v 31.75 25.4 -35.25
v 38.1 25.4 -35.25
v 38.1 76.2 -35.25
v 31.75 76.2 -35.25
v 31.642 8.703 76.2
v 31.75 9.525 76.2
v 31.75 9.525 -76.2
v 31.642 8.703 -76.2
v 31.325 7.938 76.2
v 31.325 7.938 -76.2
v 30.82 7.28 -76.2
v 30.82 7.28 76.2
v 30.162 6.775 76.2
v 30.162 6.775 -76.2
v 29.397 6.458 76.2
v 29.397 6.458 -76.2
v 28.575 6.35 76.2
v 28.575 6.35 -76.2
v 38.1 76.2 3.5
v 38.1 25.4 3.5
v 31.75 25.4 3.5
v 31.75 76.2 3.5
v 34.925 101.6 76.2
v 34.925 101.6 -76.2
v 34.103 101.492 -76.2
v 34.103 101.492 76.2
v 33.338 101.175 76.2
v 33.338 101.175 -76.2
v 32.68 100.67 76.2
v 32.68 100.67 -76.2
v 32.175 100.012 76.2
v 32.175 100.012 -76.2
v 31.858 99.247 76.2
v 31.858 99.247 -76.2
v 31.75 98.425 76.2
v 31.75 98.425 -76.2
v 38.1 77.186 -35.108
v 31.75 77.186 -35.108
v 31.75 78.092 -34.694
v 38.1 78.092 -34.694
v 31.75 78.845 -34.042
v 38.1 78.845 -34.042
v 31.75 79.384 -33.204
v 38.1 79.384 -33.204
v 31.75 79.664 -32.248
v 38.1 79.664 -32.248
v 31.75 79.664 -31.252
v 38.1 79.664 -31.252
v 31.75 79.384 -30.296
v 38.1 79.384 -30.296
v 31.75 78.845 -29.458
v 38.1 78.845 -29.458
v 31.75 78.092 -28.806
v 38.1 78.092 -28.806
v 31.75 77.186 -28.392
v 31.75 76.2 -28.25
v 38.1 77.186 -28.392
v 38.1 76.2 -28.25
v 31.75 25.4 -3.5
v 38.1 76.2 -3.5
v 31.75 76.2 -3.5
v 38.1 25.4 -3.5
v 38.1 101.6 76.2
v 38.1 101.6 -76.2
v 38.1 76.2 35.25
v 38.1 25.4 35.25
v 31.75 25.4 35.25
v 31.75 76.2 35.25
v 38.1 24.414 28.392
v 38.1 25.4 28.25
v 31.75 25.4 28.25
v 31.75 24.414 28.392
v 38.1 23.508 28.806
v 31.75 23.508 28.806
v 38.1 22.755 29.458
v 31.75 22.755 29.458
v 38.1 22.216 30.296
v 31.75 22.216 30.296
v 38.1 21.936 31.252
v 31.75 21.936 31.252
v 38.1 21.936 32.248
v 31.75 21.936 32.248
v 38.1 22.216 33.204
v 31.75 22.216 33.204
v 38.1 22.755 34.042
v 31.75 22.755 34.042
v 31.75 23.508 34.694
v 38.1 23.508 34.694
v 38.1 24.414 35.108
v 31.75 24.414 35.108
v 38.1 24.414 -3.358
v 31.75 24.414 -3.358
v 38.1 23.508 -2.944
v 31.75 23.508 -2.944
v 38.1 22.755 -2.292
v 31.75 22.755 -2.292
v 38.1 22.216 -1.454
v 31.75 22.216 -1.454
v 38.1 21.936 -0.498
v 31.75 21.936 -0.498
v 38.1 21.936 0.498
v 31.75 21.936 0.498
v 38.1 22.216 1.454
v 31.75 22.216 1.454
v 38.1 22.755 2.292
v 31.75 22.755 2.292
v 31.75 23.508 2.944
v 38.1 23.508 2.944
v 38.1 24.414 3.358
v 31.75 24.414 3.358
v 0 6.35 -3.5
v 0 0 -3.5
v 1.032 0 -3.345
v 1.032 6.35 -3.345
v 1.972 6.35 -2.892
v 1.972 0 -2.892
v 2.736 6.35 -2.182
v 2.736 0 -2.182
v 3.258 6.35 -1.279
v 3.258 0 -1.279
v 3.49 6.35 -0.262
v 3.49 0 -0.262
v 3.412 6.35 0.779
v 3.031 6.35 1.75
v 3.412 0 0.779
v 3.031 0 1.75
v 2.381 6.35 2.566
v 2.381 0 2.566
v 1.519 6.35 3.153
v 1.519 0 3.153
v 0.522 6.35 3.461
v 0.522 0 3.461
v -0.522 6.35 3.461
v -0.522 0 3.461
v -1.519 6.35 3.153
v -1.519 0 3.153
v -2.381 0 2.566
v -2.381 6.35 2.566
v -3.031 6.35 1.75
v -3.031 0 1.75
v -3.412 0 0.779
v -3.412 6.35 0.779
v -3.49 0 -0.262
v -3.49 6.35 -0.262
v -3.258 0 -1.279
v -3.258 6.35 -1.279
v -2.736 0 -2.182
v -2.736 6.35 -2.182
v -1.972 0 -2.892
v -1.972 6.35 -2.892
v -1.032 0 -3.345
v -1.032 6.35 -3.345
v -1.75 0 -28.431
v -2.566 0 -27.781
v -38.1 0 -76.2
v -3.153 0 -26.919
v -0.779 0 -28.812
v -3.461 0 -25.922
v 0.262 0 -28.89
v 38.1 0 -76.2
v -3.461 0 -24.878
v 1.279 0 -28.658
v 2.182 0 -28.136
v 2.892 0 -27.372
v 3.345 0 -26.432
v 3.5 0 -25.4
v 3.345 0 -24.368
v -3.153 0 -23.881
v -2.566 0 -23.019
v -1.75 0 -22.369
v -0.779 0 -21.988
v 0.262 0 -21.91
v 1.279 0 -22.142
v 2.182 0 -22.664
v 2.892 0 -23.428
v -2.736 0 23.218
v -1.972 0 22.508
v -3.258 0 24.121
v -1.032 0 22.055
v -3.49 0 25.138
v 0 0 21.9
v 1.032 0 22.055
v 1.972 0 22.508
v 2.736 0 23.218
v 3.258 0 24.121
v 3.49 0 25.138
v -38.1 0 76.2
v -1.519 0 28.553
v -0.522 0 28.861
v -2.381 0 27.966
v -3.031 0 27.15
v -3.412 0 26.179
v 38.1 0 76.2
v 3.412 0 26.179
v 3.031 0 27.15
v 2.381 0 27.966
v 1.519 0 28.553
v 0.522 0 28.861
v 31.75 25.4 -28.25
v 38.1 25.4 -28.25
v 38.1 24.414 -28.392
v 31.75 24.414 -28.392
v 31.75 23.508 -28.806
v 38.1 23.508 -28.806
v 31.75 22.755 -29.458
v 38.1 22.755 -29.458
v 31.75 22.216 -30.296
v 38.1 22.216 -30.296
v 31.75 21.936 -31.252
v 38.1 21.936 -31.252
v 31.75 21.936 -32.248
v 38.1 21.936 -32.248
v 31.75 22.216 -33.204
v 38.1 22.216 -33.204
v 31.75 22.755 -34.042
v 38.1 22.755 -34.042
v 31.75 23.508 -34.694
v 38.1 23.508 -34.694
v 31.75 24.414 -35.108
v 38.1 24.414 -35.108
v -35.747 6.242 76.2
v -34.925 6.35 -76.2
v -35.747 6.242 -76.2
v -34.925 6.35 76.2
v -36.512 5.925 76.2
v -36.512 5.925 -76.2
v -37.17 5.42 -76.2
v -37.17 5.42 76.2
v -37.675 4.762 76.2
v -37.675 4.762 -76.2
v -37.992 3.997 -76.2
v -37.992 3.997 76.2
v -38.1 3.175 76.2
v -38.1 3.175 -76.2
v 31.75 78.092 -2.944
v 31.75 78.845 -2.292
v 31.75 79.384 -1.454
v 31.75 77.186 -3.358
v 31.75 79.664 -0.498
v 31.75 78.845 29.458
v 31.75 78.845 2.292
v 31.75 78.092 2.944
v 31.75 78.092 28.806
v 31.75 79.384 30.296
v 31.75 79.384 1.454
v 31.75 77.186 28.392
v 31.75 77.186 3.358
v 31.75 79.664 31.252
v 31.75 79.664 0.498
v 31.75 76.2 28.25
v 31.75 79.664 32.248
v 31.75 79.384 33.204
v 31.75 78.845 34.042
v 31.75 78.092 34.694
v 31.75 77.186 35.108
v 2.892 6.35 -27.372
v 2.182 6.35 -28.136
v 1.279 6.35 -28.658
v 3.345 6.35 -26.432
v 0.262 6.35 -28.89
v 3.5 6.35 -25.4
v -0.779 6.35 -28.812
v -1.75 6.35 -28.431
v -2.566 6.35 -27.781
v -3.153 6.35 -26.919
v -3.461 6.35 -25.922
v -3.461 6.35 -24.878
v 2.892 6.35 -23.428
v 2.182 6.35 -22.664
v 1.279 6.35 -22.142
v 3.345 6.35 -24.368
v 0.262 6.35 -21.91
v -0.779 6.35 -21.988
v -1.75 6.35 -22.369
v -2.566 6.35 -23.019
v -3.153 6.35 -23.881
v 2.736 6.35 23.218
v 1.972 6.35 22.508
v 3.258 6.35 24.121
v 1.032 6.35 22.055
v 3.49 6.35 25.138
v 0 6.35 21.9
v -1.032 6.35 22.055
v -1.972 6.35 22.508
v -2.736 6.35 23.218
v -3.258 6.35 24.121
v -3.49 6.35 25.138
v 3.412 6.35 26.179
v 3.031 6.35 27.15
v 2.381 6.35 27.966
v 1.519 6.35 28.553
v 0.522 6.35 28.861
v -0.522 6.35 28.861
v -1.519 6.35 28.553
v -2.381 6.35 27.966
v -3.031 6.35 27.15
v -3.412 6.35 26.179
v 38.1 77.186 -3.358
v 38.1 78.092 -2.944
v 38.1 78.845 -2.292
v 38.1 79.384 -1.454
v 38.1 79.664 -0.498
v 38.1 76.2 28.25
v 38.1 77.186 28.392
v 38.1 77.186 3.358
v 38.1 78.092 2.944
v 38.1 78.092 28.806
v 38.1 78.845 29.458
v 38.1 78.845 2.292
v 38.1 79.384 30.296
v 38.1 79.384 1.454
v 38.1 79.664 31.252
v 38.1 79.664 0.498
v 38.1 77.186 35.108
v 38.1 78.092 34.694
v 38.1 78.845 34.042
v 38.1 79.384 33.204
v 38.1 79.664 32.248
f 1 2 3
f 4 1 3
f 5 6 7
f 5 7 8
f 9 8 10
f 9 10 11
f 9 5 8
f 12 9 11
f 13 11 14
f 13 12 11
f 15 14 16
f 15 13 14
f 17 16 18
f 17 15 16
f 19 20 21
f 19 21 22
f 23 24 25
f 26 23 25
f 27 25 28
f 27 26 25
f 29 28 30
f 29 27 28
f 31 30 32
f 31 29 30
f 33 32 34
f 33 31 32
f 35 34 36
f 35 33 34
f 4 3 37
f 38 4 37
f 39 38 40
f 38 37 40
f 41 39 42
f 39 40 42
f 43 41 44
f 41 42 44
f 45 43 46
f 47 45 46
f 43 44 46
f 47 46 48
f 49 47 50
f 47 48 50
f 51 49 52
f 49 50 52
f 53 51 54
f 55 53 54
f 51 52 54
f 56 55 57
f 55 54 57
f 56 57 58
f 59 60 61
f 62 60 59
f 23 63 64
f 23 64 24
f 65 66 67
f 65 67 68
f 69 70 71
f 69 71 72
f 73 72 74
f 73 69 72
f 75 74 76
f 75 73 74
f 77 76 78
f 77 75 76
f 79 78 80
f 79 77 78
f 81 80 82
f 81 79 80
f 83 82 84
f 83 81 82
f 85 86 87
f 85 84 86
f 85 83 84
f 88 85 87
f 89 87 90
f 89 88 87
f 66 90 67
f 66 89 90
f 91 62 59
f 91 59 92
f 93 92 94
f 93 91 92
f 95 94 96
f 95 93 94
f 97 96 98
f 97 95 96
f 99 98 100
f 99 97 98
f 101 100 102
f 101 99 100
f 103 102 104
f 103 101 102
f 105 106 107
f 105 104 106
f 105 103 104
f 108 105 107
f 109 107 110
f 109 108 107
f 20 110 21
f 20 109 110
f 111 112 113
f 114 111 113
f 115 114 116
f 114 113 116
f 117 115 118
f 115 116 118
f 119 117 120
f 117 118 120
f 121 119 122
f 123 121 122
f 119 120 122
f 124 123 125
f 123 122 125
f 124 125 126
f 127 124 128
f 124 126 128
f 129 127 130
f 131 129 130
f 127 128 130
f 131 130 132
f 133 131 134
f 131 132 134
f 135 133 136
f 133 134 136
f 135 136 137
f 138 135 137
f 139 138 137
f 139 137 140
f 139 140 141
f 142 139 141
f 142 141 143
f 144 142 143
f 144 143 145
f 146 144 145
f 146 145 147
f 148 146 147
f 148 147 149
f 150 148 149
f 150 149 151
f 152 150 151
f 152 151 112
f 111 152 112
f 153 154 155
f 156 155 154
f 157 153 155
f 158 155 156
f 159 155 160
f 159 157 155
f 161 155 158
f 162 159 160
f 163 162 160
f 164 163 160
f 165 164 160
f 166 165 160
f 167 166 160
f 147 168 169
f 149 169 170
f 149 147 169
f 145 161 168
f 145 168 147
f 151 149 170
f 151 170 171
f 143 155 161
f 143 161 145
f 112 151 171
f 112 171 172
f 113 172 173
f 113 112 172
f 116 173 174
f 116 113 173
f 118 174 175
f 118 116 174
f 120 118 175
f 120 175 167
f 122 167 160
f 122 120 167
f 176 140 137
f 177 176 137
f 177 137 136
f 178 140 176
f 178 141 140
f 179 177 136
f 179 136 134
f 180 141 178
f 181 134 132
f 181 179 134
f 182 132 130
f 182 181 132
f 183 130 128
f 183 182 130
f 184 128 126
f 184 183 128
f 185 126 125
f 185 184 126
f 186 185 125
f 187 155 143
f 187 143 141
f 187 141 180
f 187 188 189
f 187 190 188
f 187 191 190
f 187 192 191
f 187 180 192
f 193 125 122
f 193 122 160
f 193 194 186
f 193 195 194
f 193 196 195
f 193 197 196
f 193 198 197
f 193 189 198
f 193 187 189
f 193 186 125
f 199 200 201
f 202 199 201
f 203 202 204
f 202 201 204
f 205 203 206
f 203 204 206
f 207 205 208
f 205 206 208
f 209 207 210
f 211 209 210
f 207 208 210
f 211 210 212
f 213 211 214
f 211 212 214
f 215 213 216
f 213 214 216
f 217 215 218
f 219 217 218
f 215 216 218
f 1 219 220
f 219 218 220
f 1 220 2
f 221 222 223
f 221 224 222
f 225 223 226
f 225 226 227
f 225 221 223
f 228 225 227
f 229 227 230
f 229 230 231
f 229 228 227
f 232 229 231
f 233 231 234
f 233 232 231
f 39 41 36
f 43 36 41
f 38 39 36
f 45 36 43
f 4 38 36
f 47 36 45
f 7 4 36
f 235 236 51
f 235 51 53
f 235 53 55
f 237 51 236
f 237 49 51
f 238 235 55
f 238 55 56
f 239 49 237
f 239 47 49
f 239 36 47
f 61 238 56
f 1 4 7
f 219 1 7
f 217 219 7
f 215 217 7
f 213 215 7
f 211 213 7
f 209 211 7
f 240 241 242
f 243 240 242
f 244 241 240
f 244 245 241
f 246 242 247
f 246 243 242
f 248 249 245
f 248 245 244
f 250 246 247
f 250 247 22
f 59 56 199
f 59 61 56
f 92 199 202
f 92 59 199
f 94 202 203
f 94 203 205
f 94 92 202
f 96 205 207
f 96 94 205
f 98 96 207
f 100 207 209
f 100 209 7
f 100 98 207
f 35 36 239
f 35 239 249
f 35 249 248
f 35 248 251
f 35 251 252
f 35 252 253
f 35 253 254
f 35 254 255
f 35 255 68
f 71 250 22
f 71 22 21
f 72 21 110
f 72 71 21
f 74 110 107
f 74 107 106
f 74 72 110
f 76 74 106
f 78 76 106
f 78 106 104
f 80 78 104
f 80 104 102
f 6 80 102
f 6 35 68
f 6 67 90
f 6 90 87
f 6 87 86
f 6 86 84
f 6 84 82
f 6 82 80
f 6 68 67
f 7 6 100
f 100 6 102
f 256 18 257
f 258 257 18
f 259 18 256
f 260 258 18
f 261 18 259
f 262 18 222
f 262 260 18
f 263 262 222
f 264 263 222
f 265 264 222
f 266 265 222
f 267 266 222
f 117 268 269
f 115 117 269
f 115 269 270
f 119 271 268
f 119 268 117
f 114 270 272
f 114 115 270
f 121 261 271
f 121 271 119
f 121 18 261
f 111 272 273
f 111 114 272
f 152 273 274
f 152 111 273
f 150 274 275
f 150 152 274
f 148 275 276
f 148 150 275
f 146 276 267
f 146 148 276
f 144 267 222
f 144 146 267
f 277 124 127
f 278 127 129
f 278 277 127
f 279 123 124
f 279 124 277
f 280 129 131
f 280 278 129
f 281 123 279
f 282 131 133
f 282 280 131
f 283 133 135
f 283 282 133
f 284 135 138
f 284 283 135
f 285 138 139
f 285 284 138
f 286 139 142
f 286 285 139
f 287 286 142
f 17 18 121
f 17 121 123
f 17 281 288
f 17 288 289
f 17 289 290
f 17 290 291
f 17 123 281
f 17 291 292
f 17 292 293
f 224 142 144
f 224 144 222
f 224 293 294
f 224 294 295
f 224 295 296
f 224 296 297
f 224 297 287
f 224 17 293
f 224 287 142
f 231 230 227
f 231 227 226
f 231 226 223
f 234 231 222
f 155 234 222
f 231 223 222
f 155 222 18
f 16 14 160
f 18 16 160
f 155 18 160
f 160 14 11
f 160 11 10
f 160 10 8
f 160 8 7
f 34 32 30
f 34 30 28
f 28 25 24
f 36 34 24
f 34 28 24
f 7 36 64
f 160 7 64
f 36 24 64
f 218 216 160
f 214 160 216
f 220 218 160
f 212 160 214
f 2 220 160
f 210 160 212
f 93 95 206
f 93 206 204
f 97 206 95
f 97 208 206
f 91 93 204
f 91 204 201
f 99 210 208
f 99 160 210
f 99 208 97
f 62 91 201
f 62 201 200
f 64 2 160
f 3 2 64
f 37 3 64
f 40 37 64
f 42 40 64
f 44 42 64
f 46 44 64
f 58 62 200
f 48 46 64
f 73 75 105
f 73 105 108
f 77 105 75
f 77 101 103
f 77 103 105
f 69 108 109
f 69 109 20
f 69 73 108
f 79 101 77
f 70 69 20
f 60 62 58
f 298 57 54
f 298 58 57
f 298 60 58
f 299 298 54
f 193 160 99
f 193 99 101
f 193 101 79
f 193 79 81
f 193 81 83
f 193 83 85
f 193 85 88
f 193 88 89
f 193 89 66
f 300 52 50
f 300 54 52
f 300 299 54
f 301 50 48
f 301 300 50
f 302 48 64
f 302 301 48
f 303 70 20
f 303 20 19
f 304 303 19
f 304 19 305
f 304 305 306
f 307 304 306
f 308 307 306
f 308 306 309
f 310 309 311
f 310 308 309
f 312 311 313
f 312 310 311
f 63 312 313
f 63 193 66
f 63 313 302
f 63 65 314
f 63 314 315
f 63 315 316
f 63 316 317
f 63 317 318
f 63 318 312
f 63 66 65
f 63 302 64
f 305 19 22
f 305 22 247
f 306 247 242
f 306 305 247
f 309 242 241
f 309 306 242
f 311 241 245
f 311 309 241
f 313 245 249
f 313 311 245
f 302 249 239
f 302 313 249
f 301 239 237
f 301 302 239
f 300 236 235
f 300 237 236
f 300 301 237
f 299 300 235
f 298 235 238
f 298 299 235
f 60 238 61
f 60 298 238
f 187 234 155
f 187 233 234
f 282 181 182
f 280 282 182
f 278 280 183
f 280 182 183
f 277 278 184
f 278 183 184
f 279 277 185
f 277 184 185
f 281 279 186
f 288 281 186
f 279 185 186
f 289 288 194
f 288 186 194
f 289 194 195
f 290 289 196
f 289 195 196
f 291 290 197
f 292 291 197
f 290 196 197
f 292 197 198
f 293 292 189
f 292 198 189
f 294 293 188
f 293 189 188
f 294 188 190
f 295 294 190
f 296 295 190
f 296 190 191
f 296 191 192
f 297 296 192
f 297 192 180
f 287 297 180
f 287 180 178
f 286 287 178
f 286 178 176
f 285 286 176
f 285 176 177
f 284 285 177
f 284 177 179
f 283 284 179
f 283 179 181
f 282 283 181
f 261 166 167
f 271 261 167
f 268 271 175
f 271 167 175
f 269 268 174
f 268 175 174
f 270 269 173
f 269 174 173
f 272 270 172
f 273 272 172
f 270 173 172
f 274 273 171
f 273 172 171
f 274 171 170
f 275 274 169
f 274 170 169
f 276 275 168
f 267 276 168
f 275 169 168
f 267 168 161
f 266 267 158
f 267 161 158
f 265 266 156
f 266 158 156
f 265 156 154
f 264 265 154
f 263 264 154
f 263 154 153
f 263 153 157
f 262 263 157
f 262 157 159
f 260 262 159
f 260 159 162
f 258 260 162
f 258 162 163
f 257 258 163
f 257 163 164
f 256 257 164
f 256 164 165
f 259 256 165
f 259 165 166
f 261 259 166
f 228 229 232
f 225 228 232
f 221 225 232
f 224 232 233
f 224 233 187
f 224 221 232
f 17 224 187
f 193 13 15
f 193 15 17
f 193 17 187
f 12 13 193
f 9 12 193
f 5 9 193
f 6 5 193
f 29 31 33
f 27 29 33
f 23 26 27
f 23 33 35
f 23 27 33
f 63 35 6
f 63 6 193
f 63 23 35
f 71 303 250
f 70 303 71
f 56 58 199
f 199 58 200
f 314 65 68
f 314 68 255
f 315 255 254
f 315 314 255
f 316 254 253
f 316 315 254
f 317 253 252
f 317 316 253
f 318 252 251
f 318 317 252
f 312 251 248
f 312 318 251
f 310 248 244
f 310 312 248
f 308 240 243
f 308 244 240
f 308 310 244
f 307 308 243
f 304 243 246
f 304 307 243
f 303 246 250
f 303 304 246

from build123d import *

# Parameters (mm, degrees)
BOSS_EXTRUDE1_DEPTH = 76.2
CUT_EXTRUDE1_DEPTH  = 10
SKETCH4_R           = 3.5
CUT_EXTRUDE2_DEPTH  = 10


with BuildPart() as part:
    # Sketch2 → Boss-Extrude1 (new, symmetric)
    with BuildSketch(Plane.XY):
        with BuildLine():
            Line((-38.1, 0), (38.1, 0))
            Line((38.1, 0), (38.1, 101.6))
            Line((38.1, 101.6), (34.925, 101.6))
            ThreePointArc((34.925, 101.6), (32.67993597, 100.67006403), (31.75, 98.425))
            Line((31.75, 98.425), (31.75, 9.525))
            ThreePointArc((31.75, 9.525), (30.82006403, 7.27993597), (28.575, 6.35))
            Line((28.575, 6.35), (-34.925, 6.35))
            ThreePointArc((-34.925, 6.35), (-37.17006403, 5.42006403), (-38.1, 3.175))
            Line((-38.1, 3.175), (-38.1, 0))
        make_face()
    extrude(amount=BOSS_EXTRUDE1_DEPTH, both=True)

    # Sketch3 → Cut-Extrude1 (cut)
    with BuildSketch(Plane(origin=(38.1, 0, 0), x_dir=(0, 0, -1), z_dir=(1, 0, 0))):
        with BuildLine():
            Line((-28.25, 76.2), (-28.25, 25.4))
            ThreePointArc((-28.25, 25.4), (-31.75, 21.9), (-35.25, 25.4))
            Line((-35.25, 25.4), (-35.25, 76.2))
            ThreePointArc((-35.25, 76.2), (-31.75, 79.7), (-28.25, 76.2))
        make_face()
        with BuildLine():
            Line((28.25, 76.2), (28.25, 25.4))
            ThreePointArc((28.25, 25.4), (31.75, 21.9), (35.25, 25.4))
            Line((35.25, 25.4), (35.25, 76.2))
            ThreePointArc((35.25, 76.2), (31.75, 79.7), (28.25, 76.2))
        make_face()
        with BuildLine():
            Line((3.5, 76.2), (3.5, 25.4))
            ThreePointArc((3.5, 25.4), (0, 21.9), (-3.5, 25.4))
            Line((-3.5, 25.4), (-3.5, 76.2))
            ThreePointArc((-3.5, 76.2), (0, 79.7), (3.5, 76.2))
        make_face()
    extrude(amount=-CUT_EXTRUDE1_DEPTH, mode=Mode.SUBTRACT)

    # Sketch4 → Cut-Extrude2 (cut)
    with BuildSketch(Plane.XZ):
        with Locations(Location((0, 25.4, 0), (0, 0, 270))):
            Circle(SKETCH4_R)
        with Locations((0, -25.4)):
            Circle(SKETCH4_R)
        with Locations(Location((0, 0, 0), (0, 0, 270))):
            Circle(SKETCH4_R)
    extrude(amount=-CUT_EXTRUDE2_DEPTH, mode=Mode.SUBTRACT)


solid = part.part
